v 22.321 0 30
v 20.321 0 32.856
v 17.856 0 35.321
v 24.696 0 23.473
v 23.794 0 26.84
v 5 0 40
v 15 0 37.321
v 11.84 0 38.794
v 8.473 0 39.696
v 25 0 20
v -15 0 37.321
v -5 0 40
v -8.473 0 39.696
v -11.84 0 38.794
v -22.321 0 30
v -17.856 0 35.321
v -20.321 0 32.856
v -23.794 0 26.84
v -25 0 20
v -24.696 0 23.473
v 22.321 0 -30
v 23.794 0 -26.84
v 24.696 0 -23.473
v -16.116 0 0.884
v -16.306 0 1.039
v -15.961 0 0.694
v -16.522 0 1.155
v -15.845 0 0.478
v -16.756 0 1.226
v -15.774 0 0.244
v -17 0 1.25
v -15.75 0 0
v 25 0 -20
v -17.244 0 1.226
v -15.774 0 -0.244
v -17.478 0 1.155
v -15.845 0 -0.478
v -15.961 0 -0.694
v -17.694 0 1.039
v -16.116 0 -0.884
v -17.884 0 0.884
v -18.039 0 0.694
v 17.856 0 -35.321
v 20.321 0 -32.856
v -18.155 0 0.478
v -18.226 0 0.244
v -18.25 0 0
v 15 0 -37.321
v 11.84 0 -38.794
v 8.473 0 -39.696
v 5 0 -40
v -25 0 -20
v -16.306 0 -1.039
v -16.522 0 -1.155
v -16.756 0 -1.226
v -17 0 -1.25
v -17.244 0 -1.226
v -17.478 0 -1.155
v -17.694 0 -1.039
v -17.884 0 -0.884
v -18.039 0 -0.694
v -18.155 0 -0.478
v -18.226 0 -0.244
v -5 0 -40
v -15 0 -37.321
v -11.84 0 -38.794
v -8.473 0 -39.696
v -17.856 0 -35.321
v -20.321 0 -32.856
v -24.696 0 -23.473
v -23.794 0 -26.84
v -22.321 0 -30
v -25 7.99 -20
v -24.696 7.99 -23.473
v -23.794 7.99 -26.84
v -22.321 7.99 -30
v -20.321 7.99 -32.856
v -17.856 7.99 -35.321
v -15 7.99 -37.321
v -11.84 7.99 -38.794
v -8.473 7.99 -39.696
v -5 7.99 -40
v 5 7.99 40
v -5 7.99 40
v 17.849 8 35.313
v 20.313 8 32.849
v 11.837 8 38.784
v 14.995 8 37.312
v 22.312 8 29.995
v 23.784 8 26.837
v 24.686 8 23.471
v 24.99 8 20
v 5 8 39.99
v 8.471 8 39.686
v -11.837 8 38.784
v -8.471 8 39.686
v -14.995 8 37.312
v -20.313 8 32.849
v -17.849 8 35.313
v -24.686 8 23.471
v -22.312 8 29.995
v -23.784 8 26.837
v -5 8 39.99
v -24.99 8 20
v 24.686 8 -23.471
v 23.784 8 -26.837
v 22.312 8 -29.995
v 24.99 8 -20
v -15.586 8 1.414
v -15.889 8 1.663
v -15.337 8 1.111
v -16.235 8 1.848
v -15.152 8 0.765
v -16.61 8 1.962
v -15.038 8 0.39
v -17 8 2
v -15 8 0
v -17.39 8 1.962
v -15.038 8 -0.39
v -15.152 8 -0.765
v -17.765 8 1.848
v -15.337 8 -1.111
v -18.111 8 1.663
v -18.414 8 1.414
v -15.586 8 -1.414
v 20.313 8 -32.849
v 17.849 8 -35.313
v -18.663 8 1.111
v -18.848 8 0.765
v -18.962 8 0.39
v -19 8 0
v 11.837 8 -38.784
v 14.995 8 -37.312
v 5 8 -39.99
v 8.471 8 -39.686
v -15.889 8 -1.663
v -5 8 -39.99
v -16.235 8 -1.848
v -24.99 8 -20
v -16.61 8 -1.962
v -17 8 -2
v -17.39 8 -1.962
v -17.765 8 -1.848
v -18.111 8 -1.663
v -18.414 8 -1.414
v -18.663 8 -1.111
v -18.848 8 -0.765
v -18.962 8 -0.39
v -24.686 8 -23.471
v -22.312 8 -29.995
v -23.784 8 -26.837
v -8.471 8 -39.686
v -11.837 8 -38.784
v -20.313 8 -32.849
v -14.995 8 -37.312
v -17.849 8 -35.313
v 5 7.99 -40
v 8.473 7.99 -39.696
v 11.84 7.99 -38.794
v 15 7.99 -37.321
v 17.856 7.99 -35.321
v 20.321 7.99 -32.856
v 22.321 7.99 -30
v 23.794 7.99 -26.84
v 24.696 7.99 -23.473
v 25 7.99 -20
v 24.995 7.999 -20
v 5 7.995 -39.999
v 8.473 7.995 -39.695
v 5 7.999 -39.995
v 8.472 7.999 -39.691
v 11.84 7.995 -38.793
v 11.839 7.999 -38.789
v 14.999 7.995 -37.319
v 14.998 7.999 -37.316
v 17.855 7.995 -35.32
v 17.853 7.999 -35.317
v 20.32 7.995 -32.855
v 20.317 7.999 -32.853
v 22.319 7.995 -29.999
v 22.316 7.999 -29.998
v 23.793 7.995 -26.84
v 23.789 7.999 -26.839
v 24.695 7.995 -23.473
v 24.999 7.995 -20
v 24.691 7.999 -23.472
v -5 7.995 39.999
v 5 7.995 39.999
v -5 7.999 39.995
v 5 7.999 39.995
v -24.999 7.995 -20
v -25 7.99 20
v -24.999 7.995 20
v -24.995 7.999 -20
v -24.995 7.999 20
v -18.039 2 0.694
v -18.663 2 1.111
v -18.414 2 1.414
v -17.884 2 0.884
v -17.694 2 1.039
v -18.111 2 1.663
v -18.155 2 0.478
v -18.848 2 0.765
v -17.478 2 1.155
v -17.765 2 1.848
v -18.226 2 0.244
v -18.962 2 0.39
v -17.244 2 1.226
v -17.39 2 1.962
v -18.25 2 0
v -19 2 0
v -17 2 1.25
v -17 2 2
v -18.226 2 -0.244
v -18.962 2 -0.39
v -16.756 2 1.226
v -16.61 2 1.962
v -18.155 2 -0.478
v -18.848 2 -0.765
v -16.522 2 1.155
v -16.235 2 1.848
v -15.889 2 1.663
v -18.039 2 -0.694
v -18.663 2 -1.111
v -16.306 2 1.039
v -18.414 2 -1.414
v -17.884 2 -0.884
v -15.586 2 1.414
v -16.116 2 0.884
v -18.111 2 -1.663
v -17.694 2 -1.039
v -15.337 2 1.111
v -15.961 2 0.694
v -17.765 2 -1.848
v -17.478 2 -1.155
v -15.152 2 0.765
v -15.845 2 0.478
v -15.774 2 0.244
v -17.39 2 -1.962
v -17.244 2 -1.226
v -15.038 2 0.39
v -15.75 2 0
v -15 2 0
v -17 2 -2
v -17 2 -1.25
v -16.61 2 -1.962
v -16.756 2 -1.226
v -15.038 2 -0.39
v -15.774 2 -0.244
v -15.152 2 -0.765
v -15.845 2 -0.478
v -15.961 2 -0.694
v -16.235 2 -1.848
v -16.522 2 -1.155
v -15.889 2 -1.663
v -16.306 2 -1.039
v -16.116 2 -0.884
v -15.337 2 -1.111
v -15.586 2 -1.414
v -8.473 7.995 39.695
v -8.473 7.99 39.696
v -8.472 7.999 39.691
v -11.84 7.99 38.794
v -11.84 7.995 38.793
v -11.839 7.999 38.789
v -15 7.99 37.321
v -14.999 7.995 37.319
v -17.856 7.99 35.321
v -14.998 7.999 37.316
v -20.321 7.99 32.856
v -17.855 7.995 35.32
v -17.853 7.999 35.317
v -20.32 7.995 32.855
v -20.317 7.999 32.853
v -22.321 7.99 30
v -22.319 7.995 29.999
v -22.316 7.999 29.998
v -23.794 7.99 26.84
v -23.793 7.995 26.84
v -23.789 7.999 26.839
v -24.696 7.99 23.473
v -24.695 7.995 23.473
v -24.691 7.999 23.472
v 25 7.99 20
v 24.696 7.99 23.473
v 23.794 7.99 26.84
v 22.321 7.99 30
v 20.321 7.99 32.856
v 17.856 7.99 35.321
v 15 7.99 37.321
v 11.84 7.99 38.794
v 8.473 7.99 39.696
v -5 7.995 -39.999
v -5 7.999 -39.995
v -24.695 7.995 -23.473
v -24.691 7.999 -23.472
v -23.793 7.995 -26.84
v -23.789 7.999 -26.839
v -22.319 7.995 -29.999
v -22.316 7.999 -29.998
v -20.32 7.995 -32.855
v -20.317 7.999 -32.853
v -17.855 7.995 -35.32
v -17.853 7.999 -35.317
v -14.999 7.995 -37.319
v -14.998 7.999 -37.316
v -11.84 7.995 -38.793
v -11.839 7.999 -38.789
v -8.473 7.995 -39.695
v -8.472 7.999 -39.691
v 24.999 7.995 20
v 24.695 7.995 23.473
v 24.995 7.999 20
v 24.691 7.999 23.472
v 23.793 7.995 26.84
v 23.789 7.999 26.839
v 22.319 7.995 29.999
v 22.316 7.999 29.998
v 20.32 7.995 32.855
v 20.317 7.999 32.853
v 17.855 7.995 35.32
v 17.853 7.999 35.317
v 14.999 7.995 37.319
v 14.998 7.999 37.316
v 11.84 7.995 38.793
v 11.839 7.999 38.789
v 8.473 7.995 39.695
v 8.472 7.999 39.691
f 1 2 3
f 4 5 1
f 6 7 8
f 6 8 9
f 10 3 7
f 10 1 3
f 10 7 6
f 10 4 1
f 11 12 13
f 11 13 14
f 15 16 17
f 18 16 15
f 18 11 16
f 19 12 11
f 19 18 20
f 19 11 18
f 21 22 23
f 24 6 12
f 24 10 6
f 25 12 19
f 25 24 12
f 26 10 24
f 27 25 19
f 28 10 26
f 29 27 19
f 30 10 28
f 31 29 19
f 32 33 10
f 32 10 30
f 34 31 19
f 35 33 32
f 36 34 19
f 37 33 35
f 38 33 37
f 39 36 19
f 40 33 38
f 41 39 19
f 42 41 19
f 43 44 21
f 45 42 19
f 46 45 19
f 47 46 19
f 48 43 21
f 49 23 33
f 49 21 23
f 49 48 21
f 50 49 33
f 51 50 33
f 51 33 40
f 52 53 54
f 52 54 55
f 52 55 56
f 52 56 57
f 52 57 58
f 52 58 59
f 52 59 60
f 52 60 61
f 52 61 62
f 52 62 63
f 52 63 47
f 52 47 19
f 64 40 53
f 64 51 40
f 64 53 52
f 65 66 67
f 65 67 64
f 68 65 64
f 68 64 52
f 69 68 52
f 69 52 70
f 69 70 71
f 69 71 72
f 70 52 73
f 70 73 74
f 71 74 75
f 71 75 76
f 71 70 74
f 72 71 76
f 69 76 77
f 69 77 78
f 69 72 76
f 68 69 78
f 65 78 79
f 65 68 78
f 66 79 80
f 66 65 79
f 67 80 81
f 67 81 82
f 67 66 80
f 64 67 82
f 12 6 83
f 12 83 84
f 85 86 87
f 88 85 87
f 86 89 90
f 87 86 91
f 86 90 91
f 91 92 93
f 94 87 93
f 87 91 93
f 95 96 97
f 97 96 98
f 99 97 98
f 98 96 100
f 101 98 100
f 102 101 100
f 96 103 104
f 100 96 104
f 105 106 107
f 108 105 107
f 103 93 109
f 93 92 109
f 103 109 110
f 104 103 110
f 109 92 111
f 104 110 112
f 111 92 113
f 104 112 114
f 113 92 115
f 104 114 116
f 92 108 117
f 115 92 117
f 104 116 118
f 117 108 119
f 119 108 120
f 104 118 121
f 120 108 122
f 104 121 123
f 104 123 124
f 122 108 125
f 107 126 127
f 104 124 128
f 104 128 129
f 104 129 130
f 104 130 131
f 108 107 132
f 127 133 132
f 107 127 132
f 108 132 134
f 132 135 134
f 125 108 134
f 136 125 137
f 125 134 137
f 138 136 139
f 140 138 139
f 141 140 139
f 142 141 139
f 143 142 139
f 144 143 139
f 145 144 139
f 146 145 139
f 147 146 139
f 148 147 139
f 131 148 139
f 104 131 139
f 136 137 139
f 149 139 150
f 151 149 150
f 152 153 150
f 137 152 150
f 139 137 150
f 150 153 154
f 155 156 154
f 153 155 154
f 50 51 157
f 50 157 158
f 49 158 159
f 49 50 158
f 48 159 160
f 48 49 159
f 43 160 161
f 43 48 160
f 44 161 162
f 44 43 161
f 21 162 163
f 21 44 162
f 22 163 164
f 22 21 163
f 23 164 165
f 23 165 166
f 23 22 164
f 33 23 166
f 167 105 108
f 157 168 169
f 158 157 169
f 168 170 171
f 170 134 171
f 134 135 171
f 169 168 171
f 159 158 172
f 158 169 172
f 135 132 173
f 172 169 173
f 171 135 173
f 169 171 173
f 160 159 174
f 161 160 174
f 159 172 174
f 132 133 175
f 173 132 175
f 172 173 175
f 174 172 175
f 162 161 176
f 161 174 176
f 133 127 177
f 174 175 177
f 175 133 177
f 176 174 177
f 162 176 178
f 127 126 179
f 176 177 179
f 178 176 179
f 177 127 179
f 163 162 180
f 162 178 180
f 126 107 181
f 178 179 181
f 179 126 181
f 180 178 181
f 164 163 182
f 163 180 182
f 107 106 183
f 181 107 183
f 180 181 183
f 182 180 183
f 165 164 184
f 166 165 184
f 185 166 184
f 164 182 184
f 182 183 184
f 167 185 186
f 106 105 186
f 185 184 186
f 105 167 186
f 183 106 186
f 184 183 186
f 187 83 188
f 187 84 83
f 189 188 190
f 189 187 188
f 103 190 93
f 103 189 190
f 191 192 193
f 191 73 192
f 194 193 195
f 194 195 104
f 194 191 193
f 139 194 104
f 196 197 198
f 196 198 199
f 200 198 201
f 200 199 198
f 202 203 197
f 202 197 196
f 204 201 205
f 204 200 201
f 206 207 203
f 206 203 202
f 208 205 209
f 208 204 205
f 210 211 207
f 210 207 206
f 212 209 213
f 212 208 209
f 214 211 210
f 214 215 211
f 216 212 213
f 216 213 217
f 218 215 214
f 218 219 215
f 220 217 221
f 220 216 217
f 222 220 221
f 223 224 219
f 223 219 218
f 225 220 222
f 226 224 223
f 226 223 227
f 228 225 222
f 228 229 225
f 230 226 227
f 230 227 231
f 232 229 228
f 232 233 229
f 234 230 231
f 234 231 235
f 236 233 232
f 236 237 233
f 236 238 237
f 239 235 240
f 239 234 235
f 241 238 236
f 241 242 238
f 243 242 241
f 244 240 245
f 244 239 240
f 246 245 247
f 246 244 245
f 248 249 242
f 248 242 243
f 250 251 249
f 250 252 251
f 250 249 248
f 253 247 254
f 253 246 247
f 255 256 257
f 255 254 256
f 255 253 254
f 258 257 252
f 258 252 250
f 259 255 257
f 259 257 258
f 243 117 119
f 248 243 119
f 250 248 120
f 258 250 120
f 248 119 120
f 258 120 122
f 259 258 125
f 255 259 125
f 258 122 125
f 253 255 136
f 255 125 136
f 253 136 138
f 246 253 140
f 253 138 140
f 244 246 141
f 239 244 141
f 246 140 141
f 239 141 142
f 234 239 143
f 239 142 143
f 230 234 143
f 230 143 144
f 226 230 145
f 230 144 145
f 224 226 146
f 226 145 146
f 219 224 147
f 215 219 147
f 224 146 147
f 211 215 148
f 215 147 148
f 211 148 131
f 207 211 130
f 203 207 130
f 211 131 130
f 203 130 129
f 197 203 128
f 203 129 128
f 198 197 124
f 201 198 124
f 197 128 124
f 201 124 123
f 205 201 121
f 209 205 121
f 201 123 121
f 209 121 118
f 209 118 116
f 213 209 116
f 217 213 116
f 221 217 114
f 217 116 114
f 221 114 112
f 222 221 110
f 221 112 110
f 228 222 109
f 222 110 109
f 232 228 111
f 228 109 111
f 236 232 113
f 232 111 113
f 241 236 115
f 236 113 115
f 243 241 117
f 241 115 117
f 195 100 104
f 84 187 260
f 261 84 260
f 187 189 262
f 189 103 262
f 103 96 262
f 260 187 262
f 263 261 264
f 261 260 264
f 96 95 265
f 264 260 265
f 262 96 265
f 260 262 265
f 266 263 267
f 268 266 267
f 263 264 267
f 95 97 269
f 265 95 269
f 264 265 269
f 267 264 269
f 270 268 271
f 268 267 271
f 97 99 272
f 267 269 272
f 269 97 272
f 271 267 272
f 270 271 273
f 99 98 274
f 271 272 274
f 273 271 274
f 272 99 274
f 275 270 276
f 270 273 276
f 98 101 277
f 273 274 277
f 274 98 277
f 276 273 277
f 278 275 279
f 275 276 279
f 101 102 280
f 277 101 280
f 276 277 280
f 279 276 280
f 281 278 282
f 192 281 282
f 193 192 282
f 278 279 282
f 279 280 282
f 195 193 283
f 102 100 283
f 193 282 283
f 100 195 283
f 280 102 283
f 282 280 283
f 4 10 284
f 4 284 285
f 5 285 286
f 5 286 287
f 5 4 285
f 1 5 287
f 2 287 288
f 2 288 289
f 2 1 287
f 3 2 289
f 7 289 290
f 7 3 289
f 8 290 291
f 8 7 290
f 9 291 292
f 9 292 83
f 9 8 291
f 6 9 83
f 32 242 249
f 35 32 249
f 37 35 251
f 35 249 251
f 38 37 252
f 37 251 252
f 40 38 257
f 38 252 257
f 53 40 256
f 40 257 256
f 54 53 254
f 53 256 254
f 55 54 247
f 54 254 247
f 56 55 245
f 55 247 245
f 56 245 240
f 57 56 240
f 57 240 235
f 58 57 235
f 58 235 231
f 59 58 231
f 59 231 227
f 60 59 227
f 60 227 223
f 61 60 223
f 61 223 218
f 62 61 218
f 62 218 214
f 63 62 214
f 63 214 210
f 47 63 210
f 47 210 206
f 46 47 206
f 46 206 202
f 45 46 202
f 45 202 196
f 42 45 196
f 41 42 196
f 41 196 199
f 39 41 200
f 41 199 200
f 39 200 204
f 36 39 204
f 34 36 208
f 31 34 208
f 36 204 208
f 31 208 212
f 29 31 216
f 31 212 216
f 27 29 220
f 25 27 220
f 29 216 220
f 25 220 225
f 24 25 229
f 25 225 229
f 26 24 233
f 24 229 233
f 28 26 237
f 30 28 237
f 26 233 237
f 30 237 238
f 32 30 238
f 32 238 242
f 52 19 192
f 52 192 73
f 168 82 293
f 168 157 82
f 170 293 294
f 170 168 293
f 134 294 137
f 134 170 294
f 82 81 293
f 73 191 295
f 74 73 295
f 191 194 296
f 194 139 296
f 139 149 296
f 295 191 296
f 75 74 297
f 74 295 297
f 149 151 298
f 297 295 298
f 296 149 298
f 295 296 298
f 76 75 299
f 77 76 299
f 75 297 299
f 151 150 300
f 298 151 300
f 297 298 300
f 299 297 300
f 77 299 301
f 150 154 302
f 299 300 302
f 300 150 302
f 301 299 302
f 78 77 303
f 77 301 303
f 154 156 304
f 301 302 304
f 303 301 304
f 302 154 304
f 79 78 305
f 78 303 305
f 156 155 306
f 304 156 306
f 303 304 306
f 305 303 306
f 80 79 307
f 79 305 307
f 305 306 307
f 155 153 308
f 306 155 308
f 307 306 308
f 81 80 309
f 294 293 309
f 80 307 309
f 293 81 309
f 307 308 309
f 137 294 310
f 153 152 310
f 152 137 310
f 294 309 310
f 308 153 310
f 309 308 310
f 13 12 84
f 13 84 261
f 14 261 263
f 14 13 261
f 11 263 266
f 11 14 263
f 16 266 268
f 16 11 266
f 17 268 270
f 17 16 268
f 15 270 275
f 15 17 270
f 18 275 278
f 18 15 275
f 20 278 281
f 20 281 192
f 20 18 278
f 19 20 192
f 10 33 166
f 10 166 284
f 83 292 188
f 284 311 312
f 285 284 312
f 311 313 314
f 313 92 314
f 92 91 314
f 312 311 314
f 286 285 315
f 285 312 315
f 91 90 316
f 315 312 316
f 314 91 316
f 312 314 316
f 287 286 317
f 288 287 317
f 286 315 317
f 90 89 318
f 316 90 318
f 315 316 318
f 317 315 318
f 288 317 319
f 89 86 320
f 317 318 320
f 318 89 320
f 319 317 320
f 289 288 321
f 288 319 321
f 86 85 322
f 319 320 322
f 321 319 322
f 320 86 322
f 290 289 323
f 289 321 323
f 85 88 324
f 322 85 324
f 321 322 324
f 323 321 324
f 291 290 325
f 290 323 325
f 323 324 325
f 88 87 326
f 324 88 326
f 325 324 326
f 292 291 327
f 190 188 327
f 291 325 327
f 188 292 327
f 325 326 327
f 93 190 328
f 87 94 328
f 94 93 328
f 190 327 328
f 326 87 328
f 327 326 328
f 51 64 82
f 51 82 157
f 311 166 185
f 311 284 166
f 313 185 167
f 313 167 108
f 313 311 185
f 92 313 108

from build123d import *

# Parameters (mm, degrees)
SALIENTE_EXTRUIR1_DEPTH = 8
REDONDEO1_R             = 0.01
CROQUIS3_R              = 2
CORTAR_EXTRUIR1_DEPTH   = 6
CROQUIS4_R              = 1.25
CORTAR_EXTRUIR2_DEPTH   = 10


with BuildPart() as part:
    # Croquis2 → Saliente-Extruir1 (new body)
    with BuildSketch(Plane(origin=(0, 0, 0), x_dir=(1, 0, 0), z_dir=(0, 1, 0))):
        with BuildLine():
            Line((-5, 40), (5, 40))
            ThreePointArc((5, 40), (19.142135624, 34.142135624), (25, 20))
            Line((25, 20), (25, -20))
            ThreePointArc((25, -20), (19.142135624, -34.142135624), (5, -40))
            Line((5, -40), (-5, -40))
            ThreePointArc((-5, -40), (-19.142135624, -34.142135624), (-25, -20))
            Line((-25, -20), (-25, 20))
            ThreePointArc((-25, 20), (-19.142135624, 34.142135624), (-5, 40))
        make_face()
    extrude(amount=SALIENTE_EXTRUIR1_DEPTH)

    # Redondeo1
    redondeo1_edges = [part.edges().sort_by_distance(p)[0] for p in [
        (-19.142135624, 8, 34.142135624),
        (0, 8, 40),
        (19.142135624, 8, 34.142135624),
        (25, 8, 0),
        (19.142135624, 8, -34.142135624),
        (0, 8, -40),
        (-19.142135624, 8, -34.142135624),
        (-25, 8, 0),
    ]]
    fillet(redondeo1_edges, radius=REDONDEO1_R)

    # Croquis3 → Cortar-Extruir1 (cut)
    with BuildSketch(Plane(origin=(0, 8, 0), x_dir=(1, 0, 0), z_dir=(0, 1, 0))):
        with Locations((-17, 0)):
            Circle(CROQUIS3_R)
    extrude(amount=-CORTAR_EXTRUIR1_DEPTH, mode=Mode.SUBTRACT)

    # Croquis4 → Cortar-Extruir2 (cut)
    with BuildSketch(Plane(origin=(0, 8, 0), x_dir=(1, 0, 0), z_dir=(0, 1, 0))):
        with Locations((-17, 0)):
            Circle(CROQUIS4_R)
    extrude(amount=-CORTAR_EXTRUIR2_DEPTH, mode=Mode.SUBTRACT)


solid = part.part
